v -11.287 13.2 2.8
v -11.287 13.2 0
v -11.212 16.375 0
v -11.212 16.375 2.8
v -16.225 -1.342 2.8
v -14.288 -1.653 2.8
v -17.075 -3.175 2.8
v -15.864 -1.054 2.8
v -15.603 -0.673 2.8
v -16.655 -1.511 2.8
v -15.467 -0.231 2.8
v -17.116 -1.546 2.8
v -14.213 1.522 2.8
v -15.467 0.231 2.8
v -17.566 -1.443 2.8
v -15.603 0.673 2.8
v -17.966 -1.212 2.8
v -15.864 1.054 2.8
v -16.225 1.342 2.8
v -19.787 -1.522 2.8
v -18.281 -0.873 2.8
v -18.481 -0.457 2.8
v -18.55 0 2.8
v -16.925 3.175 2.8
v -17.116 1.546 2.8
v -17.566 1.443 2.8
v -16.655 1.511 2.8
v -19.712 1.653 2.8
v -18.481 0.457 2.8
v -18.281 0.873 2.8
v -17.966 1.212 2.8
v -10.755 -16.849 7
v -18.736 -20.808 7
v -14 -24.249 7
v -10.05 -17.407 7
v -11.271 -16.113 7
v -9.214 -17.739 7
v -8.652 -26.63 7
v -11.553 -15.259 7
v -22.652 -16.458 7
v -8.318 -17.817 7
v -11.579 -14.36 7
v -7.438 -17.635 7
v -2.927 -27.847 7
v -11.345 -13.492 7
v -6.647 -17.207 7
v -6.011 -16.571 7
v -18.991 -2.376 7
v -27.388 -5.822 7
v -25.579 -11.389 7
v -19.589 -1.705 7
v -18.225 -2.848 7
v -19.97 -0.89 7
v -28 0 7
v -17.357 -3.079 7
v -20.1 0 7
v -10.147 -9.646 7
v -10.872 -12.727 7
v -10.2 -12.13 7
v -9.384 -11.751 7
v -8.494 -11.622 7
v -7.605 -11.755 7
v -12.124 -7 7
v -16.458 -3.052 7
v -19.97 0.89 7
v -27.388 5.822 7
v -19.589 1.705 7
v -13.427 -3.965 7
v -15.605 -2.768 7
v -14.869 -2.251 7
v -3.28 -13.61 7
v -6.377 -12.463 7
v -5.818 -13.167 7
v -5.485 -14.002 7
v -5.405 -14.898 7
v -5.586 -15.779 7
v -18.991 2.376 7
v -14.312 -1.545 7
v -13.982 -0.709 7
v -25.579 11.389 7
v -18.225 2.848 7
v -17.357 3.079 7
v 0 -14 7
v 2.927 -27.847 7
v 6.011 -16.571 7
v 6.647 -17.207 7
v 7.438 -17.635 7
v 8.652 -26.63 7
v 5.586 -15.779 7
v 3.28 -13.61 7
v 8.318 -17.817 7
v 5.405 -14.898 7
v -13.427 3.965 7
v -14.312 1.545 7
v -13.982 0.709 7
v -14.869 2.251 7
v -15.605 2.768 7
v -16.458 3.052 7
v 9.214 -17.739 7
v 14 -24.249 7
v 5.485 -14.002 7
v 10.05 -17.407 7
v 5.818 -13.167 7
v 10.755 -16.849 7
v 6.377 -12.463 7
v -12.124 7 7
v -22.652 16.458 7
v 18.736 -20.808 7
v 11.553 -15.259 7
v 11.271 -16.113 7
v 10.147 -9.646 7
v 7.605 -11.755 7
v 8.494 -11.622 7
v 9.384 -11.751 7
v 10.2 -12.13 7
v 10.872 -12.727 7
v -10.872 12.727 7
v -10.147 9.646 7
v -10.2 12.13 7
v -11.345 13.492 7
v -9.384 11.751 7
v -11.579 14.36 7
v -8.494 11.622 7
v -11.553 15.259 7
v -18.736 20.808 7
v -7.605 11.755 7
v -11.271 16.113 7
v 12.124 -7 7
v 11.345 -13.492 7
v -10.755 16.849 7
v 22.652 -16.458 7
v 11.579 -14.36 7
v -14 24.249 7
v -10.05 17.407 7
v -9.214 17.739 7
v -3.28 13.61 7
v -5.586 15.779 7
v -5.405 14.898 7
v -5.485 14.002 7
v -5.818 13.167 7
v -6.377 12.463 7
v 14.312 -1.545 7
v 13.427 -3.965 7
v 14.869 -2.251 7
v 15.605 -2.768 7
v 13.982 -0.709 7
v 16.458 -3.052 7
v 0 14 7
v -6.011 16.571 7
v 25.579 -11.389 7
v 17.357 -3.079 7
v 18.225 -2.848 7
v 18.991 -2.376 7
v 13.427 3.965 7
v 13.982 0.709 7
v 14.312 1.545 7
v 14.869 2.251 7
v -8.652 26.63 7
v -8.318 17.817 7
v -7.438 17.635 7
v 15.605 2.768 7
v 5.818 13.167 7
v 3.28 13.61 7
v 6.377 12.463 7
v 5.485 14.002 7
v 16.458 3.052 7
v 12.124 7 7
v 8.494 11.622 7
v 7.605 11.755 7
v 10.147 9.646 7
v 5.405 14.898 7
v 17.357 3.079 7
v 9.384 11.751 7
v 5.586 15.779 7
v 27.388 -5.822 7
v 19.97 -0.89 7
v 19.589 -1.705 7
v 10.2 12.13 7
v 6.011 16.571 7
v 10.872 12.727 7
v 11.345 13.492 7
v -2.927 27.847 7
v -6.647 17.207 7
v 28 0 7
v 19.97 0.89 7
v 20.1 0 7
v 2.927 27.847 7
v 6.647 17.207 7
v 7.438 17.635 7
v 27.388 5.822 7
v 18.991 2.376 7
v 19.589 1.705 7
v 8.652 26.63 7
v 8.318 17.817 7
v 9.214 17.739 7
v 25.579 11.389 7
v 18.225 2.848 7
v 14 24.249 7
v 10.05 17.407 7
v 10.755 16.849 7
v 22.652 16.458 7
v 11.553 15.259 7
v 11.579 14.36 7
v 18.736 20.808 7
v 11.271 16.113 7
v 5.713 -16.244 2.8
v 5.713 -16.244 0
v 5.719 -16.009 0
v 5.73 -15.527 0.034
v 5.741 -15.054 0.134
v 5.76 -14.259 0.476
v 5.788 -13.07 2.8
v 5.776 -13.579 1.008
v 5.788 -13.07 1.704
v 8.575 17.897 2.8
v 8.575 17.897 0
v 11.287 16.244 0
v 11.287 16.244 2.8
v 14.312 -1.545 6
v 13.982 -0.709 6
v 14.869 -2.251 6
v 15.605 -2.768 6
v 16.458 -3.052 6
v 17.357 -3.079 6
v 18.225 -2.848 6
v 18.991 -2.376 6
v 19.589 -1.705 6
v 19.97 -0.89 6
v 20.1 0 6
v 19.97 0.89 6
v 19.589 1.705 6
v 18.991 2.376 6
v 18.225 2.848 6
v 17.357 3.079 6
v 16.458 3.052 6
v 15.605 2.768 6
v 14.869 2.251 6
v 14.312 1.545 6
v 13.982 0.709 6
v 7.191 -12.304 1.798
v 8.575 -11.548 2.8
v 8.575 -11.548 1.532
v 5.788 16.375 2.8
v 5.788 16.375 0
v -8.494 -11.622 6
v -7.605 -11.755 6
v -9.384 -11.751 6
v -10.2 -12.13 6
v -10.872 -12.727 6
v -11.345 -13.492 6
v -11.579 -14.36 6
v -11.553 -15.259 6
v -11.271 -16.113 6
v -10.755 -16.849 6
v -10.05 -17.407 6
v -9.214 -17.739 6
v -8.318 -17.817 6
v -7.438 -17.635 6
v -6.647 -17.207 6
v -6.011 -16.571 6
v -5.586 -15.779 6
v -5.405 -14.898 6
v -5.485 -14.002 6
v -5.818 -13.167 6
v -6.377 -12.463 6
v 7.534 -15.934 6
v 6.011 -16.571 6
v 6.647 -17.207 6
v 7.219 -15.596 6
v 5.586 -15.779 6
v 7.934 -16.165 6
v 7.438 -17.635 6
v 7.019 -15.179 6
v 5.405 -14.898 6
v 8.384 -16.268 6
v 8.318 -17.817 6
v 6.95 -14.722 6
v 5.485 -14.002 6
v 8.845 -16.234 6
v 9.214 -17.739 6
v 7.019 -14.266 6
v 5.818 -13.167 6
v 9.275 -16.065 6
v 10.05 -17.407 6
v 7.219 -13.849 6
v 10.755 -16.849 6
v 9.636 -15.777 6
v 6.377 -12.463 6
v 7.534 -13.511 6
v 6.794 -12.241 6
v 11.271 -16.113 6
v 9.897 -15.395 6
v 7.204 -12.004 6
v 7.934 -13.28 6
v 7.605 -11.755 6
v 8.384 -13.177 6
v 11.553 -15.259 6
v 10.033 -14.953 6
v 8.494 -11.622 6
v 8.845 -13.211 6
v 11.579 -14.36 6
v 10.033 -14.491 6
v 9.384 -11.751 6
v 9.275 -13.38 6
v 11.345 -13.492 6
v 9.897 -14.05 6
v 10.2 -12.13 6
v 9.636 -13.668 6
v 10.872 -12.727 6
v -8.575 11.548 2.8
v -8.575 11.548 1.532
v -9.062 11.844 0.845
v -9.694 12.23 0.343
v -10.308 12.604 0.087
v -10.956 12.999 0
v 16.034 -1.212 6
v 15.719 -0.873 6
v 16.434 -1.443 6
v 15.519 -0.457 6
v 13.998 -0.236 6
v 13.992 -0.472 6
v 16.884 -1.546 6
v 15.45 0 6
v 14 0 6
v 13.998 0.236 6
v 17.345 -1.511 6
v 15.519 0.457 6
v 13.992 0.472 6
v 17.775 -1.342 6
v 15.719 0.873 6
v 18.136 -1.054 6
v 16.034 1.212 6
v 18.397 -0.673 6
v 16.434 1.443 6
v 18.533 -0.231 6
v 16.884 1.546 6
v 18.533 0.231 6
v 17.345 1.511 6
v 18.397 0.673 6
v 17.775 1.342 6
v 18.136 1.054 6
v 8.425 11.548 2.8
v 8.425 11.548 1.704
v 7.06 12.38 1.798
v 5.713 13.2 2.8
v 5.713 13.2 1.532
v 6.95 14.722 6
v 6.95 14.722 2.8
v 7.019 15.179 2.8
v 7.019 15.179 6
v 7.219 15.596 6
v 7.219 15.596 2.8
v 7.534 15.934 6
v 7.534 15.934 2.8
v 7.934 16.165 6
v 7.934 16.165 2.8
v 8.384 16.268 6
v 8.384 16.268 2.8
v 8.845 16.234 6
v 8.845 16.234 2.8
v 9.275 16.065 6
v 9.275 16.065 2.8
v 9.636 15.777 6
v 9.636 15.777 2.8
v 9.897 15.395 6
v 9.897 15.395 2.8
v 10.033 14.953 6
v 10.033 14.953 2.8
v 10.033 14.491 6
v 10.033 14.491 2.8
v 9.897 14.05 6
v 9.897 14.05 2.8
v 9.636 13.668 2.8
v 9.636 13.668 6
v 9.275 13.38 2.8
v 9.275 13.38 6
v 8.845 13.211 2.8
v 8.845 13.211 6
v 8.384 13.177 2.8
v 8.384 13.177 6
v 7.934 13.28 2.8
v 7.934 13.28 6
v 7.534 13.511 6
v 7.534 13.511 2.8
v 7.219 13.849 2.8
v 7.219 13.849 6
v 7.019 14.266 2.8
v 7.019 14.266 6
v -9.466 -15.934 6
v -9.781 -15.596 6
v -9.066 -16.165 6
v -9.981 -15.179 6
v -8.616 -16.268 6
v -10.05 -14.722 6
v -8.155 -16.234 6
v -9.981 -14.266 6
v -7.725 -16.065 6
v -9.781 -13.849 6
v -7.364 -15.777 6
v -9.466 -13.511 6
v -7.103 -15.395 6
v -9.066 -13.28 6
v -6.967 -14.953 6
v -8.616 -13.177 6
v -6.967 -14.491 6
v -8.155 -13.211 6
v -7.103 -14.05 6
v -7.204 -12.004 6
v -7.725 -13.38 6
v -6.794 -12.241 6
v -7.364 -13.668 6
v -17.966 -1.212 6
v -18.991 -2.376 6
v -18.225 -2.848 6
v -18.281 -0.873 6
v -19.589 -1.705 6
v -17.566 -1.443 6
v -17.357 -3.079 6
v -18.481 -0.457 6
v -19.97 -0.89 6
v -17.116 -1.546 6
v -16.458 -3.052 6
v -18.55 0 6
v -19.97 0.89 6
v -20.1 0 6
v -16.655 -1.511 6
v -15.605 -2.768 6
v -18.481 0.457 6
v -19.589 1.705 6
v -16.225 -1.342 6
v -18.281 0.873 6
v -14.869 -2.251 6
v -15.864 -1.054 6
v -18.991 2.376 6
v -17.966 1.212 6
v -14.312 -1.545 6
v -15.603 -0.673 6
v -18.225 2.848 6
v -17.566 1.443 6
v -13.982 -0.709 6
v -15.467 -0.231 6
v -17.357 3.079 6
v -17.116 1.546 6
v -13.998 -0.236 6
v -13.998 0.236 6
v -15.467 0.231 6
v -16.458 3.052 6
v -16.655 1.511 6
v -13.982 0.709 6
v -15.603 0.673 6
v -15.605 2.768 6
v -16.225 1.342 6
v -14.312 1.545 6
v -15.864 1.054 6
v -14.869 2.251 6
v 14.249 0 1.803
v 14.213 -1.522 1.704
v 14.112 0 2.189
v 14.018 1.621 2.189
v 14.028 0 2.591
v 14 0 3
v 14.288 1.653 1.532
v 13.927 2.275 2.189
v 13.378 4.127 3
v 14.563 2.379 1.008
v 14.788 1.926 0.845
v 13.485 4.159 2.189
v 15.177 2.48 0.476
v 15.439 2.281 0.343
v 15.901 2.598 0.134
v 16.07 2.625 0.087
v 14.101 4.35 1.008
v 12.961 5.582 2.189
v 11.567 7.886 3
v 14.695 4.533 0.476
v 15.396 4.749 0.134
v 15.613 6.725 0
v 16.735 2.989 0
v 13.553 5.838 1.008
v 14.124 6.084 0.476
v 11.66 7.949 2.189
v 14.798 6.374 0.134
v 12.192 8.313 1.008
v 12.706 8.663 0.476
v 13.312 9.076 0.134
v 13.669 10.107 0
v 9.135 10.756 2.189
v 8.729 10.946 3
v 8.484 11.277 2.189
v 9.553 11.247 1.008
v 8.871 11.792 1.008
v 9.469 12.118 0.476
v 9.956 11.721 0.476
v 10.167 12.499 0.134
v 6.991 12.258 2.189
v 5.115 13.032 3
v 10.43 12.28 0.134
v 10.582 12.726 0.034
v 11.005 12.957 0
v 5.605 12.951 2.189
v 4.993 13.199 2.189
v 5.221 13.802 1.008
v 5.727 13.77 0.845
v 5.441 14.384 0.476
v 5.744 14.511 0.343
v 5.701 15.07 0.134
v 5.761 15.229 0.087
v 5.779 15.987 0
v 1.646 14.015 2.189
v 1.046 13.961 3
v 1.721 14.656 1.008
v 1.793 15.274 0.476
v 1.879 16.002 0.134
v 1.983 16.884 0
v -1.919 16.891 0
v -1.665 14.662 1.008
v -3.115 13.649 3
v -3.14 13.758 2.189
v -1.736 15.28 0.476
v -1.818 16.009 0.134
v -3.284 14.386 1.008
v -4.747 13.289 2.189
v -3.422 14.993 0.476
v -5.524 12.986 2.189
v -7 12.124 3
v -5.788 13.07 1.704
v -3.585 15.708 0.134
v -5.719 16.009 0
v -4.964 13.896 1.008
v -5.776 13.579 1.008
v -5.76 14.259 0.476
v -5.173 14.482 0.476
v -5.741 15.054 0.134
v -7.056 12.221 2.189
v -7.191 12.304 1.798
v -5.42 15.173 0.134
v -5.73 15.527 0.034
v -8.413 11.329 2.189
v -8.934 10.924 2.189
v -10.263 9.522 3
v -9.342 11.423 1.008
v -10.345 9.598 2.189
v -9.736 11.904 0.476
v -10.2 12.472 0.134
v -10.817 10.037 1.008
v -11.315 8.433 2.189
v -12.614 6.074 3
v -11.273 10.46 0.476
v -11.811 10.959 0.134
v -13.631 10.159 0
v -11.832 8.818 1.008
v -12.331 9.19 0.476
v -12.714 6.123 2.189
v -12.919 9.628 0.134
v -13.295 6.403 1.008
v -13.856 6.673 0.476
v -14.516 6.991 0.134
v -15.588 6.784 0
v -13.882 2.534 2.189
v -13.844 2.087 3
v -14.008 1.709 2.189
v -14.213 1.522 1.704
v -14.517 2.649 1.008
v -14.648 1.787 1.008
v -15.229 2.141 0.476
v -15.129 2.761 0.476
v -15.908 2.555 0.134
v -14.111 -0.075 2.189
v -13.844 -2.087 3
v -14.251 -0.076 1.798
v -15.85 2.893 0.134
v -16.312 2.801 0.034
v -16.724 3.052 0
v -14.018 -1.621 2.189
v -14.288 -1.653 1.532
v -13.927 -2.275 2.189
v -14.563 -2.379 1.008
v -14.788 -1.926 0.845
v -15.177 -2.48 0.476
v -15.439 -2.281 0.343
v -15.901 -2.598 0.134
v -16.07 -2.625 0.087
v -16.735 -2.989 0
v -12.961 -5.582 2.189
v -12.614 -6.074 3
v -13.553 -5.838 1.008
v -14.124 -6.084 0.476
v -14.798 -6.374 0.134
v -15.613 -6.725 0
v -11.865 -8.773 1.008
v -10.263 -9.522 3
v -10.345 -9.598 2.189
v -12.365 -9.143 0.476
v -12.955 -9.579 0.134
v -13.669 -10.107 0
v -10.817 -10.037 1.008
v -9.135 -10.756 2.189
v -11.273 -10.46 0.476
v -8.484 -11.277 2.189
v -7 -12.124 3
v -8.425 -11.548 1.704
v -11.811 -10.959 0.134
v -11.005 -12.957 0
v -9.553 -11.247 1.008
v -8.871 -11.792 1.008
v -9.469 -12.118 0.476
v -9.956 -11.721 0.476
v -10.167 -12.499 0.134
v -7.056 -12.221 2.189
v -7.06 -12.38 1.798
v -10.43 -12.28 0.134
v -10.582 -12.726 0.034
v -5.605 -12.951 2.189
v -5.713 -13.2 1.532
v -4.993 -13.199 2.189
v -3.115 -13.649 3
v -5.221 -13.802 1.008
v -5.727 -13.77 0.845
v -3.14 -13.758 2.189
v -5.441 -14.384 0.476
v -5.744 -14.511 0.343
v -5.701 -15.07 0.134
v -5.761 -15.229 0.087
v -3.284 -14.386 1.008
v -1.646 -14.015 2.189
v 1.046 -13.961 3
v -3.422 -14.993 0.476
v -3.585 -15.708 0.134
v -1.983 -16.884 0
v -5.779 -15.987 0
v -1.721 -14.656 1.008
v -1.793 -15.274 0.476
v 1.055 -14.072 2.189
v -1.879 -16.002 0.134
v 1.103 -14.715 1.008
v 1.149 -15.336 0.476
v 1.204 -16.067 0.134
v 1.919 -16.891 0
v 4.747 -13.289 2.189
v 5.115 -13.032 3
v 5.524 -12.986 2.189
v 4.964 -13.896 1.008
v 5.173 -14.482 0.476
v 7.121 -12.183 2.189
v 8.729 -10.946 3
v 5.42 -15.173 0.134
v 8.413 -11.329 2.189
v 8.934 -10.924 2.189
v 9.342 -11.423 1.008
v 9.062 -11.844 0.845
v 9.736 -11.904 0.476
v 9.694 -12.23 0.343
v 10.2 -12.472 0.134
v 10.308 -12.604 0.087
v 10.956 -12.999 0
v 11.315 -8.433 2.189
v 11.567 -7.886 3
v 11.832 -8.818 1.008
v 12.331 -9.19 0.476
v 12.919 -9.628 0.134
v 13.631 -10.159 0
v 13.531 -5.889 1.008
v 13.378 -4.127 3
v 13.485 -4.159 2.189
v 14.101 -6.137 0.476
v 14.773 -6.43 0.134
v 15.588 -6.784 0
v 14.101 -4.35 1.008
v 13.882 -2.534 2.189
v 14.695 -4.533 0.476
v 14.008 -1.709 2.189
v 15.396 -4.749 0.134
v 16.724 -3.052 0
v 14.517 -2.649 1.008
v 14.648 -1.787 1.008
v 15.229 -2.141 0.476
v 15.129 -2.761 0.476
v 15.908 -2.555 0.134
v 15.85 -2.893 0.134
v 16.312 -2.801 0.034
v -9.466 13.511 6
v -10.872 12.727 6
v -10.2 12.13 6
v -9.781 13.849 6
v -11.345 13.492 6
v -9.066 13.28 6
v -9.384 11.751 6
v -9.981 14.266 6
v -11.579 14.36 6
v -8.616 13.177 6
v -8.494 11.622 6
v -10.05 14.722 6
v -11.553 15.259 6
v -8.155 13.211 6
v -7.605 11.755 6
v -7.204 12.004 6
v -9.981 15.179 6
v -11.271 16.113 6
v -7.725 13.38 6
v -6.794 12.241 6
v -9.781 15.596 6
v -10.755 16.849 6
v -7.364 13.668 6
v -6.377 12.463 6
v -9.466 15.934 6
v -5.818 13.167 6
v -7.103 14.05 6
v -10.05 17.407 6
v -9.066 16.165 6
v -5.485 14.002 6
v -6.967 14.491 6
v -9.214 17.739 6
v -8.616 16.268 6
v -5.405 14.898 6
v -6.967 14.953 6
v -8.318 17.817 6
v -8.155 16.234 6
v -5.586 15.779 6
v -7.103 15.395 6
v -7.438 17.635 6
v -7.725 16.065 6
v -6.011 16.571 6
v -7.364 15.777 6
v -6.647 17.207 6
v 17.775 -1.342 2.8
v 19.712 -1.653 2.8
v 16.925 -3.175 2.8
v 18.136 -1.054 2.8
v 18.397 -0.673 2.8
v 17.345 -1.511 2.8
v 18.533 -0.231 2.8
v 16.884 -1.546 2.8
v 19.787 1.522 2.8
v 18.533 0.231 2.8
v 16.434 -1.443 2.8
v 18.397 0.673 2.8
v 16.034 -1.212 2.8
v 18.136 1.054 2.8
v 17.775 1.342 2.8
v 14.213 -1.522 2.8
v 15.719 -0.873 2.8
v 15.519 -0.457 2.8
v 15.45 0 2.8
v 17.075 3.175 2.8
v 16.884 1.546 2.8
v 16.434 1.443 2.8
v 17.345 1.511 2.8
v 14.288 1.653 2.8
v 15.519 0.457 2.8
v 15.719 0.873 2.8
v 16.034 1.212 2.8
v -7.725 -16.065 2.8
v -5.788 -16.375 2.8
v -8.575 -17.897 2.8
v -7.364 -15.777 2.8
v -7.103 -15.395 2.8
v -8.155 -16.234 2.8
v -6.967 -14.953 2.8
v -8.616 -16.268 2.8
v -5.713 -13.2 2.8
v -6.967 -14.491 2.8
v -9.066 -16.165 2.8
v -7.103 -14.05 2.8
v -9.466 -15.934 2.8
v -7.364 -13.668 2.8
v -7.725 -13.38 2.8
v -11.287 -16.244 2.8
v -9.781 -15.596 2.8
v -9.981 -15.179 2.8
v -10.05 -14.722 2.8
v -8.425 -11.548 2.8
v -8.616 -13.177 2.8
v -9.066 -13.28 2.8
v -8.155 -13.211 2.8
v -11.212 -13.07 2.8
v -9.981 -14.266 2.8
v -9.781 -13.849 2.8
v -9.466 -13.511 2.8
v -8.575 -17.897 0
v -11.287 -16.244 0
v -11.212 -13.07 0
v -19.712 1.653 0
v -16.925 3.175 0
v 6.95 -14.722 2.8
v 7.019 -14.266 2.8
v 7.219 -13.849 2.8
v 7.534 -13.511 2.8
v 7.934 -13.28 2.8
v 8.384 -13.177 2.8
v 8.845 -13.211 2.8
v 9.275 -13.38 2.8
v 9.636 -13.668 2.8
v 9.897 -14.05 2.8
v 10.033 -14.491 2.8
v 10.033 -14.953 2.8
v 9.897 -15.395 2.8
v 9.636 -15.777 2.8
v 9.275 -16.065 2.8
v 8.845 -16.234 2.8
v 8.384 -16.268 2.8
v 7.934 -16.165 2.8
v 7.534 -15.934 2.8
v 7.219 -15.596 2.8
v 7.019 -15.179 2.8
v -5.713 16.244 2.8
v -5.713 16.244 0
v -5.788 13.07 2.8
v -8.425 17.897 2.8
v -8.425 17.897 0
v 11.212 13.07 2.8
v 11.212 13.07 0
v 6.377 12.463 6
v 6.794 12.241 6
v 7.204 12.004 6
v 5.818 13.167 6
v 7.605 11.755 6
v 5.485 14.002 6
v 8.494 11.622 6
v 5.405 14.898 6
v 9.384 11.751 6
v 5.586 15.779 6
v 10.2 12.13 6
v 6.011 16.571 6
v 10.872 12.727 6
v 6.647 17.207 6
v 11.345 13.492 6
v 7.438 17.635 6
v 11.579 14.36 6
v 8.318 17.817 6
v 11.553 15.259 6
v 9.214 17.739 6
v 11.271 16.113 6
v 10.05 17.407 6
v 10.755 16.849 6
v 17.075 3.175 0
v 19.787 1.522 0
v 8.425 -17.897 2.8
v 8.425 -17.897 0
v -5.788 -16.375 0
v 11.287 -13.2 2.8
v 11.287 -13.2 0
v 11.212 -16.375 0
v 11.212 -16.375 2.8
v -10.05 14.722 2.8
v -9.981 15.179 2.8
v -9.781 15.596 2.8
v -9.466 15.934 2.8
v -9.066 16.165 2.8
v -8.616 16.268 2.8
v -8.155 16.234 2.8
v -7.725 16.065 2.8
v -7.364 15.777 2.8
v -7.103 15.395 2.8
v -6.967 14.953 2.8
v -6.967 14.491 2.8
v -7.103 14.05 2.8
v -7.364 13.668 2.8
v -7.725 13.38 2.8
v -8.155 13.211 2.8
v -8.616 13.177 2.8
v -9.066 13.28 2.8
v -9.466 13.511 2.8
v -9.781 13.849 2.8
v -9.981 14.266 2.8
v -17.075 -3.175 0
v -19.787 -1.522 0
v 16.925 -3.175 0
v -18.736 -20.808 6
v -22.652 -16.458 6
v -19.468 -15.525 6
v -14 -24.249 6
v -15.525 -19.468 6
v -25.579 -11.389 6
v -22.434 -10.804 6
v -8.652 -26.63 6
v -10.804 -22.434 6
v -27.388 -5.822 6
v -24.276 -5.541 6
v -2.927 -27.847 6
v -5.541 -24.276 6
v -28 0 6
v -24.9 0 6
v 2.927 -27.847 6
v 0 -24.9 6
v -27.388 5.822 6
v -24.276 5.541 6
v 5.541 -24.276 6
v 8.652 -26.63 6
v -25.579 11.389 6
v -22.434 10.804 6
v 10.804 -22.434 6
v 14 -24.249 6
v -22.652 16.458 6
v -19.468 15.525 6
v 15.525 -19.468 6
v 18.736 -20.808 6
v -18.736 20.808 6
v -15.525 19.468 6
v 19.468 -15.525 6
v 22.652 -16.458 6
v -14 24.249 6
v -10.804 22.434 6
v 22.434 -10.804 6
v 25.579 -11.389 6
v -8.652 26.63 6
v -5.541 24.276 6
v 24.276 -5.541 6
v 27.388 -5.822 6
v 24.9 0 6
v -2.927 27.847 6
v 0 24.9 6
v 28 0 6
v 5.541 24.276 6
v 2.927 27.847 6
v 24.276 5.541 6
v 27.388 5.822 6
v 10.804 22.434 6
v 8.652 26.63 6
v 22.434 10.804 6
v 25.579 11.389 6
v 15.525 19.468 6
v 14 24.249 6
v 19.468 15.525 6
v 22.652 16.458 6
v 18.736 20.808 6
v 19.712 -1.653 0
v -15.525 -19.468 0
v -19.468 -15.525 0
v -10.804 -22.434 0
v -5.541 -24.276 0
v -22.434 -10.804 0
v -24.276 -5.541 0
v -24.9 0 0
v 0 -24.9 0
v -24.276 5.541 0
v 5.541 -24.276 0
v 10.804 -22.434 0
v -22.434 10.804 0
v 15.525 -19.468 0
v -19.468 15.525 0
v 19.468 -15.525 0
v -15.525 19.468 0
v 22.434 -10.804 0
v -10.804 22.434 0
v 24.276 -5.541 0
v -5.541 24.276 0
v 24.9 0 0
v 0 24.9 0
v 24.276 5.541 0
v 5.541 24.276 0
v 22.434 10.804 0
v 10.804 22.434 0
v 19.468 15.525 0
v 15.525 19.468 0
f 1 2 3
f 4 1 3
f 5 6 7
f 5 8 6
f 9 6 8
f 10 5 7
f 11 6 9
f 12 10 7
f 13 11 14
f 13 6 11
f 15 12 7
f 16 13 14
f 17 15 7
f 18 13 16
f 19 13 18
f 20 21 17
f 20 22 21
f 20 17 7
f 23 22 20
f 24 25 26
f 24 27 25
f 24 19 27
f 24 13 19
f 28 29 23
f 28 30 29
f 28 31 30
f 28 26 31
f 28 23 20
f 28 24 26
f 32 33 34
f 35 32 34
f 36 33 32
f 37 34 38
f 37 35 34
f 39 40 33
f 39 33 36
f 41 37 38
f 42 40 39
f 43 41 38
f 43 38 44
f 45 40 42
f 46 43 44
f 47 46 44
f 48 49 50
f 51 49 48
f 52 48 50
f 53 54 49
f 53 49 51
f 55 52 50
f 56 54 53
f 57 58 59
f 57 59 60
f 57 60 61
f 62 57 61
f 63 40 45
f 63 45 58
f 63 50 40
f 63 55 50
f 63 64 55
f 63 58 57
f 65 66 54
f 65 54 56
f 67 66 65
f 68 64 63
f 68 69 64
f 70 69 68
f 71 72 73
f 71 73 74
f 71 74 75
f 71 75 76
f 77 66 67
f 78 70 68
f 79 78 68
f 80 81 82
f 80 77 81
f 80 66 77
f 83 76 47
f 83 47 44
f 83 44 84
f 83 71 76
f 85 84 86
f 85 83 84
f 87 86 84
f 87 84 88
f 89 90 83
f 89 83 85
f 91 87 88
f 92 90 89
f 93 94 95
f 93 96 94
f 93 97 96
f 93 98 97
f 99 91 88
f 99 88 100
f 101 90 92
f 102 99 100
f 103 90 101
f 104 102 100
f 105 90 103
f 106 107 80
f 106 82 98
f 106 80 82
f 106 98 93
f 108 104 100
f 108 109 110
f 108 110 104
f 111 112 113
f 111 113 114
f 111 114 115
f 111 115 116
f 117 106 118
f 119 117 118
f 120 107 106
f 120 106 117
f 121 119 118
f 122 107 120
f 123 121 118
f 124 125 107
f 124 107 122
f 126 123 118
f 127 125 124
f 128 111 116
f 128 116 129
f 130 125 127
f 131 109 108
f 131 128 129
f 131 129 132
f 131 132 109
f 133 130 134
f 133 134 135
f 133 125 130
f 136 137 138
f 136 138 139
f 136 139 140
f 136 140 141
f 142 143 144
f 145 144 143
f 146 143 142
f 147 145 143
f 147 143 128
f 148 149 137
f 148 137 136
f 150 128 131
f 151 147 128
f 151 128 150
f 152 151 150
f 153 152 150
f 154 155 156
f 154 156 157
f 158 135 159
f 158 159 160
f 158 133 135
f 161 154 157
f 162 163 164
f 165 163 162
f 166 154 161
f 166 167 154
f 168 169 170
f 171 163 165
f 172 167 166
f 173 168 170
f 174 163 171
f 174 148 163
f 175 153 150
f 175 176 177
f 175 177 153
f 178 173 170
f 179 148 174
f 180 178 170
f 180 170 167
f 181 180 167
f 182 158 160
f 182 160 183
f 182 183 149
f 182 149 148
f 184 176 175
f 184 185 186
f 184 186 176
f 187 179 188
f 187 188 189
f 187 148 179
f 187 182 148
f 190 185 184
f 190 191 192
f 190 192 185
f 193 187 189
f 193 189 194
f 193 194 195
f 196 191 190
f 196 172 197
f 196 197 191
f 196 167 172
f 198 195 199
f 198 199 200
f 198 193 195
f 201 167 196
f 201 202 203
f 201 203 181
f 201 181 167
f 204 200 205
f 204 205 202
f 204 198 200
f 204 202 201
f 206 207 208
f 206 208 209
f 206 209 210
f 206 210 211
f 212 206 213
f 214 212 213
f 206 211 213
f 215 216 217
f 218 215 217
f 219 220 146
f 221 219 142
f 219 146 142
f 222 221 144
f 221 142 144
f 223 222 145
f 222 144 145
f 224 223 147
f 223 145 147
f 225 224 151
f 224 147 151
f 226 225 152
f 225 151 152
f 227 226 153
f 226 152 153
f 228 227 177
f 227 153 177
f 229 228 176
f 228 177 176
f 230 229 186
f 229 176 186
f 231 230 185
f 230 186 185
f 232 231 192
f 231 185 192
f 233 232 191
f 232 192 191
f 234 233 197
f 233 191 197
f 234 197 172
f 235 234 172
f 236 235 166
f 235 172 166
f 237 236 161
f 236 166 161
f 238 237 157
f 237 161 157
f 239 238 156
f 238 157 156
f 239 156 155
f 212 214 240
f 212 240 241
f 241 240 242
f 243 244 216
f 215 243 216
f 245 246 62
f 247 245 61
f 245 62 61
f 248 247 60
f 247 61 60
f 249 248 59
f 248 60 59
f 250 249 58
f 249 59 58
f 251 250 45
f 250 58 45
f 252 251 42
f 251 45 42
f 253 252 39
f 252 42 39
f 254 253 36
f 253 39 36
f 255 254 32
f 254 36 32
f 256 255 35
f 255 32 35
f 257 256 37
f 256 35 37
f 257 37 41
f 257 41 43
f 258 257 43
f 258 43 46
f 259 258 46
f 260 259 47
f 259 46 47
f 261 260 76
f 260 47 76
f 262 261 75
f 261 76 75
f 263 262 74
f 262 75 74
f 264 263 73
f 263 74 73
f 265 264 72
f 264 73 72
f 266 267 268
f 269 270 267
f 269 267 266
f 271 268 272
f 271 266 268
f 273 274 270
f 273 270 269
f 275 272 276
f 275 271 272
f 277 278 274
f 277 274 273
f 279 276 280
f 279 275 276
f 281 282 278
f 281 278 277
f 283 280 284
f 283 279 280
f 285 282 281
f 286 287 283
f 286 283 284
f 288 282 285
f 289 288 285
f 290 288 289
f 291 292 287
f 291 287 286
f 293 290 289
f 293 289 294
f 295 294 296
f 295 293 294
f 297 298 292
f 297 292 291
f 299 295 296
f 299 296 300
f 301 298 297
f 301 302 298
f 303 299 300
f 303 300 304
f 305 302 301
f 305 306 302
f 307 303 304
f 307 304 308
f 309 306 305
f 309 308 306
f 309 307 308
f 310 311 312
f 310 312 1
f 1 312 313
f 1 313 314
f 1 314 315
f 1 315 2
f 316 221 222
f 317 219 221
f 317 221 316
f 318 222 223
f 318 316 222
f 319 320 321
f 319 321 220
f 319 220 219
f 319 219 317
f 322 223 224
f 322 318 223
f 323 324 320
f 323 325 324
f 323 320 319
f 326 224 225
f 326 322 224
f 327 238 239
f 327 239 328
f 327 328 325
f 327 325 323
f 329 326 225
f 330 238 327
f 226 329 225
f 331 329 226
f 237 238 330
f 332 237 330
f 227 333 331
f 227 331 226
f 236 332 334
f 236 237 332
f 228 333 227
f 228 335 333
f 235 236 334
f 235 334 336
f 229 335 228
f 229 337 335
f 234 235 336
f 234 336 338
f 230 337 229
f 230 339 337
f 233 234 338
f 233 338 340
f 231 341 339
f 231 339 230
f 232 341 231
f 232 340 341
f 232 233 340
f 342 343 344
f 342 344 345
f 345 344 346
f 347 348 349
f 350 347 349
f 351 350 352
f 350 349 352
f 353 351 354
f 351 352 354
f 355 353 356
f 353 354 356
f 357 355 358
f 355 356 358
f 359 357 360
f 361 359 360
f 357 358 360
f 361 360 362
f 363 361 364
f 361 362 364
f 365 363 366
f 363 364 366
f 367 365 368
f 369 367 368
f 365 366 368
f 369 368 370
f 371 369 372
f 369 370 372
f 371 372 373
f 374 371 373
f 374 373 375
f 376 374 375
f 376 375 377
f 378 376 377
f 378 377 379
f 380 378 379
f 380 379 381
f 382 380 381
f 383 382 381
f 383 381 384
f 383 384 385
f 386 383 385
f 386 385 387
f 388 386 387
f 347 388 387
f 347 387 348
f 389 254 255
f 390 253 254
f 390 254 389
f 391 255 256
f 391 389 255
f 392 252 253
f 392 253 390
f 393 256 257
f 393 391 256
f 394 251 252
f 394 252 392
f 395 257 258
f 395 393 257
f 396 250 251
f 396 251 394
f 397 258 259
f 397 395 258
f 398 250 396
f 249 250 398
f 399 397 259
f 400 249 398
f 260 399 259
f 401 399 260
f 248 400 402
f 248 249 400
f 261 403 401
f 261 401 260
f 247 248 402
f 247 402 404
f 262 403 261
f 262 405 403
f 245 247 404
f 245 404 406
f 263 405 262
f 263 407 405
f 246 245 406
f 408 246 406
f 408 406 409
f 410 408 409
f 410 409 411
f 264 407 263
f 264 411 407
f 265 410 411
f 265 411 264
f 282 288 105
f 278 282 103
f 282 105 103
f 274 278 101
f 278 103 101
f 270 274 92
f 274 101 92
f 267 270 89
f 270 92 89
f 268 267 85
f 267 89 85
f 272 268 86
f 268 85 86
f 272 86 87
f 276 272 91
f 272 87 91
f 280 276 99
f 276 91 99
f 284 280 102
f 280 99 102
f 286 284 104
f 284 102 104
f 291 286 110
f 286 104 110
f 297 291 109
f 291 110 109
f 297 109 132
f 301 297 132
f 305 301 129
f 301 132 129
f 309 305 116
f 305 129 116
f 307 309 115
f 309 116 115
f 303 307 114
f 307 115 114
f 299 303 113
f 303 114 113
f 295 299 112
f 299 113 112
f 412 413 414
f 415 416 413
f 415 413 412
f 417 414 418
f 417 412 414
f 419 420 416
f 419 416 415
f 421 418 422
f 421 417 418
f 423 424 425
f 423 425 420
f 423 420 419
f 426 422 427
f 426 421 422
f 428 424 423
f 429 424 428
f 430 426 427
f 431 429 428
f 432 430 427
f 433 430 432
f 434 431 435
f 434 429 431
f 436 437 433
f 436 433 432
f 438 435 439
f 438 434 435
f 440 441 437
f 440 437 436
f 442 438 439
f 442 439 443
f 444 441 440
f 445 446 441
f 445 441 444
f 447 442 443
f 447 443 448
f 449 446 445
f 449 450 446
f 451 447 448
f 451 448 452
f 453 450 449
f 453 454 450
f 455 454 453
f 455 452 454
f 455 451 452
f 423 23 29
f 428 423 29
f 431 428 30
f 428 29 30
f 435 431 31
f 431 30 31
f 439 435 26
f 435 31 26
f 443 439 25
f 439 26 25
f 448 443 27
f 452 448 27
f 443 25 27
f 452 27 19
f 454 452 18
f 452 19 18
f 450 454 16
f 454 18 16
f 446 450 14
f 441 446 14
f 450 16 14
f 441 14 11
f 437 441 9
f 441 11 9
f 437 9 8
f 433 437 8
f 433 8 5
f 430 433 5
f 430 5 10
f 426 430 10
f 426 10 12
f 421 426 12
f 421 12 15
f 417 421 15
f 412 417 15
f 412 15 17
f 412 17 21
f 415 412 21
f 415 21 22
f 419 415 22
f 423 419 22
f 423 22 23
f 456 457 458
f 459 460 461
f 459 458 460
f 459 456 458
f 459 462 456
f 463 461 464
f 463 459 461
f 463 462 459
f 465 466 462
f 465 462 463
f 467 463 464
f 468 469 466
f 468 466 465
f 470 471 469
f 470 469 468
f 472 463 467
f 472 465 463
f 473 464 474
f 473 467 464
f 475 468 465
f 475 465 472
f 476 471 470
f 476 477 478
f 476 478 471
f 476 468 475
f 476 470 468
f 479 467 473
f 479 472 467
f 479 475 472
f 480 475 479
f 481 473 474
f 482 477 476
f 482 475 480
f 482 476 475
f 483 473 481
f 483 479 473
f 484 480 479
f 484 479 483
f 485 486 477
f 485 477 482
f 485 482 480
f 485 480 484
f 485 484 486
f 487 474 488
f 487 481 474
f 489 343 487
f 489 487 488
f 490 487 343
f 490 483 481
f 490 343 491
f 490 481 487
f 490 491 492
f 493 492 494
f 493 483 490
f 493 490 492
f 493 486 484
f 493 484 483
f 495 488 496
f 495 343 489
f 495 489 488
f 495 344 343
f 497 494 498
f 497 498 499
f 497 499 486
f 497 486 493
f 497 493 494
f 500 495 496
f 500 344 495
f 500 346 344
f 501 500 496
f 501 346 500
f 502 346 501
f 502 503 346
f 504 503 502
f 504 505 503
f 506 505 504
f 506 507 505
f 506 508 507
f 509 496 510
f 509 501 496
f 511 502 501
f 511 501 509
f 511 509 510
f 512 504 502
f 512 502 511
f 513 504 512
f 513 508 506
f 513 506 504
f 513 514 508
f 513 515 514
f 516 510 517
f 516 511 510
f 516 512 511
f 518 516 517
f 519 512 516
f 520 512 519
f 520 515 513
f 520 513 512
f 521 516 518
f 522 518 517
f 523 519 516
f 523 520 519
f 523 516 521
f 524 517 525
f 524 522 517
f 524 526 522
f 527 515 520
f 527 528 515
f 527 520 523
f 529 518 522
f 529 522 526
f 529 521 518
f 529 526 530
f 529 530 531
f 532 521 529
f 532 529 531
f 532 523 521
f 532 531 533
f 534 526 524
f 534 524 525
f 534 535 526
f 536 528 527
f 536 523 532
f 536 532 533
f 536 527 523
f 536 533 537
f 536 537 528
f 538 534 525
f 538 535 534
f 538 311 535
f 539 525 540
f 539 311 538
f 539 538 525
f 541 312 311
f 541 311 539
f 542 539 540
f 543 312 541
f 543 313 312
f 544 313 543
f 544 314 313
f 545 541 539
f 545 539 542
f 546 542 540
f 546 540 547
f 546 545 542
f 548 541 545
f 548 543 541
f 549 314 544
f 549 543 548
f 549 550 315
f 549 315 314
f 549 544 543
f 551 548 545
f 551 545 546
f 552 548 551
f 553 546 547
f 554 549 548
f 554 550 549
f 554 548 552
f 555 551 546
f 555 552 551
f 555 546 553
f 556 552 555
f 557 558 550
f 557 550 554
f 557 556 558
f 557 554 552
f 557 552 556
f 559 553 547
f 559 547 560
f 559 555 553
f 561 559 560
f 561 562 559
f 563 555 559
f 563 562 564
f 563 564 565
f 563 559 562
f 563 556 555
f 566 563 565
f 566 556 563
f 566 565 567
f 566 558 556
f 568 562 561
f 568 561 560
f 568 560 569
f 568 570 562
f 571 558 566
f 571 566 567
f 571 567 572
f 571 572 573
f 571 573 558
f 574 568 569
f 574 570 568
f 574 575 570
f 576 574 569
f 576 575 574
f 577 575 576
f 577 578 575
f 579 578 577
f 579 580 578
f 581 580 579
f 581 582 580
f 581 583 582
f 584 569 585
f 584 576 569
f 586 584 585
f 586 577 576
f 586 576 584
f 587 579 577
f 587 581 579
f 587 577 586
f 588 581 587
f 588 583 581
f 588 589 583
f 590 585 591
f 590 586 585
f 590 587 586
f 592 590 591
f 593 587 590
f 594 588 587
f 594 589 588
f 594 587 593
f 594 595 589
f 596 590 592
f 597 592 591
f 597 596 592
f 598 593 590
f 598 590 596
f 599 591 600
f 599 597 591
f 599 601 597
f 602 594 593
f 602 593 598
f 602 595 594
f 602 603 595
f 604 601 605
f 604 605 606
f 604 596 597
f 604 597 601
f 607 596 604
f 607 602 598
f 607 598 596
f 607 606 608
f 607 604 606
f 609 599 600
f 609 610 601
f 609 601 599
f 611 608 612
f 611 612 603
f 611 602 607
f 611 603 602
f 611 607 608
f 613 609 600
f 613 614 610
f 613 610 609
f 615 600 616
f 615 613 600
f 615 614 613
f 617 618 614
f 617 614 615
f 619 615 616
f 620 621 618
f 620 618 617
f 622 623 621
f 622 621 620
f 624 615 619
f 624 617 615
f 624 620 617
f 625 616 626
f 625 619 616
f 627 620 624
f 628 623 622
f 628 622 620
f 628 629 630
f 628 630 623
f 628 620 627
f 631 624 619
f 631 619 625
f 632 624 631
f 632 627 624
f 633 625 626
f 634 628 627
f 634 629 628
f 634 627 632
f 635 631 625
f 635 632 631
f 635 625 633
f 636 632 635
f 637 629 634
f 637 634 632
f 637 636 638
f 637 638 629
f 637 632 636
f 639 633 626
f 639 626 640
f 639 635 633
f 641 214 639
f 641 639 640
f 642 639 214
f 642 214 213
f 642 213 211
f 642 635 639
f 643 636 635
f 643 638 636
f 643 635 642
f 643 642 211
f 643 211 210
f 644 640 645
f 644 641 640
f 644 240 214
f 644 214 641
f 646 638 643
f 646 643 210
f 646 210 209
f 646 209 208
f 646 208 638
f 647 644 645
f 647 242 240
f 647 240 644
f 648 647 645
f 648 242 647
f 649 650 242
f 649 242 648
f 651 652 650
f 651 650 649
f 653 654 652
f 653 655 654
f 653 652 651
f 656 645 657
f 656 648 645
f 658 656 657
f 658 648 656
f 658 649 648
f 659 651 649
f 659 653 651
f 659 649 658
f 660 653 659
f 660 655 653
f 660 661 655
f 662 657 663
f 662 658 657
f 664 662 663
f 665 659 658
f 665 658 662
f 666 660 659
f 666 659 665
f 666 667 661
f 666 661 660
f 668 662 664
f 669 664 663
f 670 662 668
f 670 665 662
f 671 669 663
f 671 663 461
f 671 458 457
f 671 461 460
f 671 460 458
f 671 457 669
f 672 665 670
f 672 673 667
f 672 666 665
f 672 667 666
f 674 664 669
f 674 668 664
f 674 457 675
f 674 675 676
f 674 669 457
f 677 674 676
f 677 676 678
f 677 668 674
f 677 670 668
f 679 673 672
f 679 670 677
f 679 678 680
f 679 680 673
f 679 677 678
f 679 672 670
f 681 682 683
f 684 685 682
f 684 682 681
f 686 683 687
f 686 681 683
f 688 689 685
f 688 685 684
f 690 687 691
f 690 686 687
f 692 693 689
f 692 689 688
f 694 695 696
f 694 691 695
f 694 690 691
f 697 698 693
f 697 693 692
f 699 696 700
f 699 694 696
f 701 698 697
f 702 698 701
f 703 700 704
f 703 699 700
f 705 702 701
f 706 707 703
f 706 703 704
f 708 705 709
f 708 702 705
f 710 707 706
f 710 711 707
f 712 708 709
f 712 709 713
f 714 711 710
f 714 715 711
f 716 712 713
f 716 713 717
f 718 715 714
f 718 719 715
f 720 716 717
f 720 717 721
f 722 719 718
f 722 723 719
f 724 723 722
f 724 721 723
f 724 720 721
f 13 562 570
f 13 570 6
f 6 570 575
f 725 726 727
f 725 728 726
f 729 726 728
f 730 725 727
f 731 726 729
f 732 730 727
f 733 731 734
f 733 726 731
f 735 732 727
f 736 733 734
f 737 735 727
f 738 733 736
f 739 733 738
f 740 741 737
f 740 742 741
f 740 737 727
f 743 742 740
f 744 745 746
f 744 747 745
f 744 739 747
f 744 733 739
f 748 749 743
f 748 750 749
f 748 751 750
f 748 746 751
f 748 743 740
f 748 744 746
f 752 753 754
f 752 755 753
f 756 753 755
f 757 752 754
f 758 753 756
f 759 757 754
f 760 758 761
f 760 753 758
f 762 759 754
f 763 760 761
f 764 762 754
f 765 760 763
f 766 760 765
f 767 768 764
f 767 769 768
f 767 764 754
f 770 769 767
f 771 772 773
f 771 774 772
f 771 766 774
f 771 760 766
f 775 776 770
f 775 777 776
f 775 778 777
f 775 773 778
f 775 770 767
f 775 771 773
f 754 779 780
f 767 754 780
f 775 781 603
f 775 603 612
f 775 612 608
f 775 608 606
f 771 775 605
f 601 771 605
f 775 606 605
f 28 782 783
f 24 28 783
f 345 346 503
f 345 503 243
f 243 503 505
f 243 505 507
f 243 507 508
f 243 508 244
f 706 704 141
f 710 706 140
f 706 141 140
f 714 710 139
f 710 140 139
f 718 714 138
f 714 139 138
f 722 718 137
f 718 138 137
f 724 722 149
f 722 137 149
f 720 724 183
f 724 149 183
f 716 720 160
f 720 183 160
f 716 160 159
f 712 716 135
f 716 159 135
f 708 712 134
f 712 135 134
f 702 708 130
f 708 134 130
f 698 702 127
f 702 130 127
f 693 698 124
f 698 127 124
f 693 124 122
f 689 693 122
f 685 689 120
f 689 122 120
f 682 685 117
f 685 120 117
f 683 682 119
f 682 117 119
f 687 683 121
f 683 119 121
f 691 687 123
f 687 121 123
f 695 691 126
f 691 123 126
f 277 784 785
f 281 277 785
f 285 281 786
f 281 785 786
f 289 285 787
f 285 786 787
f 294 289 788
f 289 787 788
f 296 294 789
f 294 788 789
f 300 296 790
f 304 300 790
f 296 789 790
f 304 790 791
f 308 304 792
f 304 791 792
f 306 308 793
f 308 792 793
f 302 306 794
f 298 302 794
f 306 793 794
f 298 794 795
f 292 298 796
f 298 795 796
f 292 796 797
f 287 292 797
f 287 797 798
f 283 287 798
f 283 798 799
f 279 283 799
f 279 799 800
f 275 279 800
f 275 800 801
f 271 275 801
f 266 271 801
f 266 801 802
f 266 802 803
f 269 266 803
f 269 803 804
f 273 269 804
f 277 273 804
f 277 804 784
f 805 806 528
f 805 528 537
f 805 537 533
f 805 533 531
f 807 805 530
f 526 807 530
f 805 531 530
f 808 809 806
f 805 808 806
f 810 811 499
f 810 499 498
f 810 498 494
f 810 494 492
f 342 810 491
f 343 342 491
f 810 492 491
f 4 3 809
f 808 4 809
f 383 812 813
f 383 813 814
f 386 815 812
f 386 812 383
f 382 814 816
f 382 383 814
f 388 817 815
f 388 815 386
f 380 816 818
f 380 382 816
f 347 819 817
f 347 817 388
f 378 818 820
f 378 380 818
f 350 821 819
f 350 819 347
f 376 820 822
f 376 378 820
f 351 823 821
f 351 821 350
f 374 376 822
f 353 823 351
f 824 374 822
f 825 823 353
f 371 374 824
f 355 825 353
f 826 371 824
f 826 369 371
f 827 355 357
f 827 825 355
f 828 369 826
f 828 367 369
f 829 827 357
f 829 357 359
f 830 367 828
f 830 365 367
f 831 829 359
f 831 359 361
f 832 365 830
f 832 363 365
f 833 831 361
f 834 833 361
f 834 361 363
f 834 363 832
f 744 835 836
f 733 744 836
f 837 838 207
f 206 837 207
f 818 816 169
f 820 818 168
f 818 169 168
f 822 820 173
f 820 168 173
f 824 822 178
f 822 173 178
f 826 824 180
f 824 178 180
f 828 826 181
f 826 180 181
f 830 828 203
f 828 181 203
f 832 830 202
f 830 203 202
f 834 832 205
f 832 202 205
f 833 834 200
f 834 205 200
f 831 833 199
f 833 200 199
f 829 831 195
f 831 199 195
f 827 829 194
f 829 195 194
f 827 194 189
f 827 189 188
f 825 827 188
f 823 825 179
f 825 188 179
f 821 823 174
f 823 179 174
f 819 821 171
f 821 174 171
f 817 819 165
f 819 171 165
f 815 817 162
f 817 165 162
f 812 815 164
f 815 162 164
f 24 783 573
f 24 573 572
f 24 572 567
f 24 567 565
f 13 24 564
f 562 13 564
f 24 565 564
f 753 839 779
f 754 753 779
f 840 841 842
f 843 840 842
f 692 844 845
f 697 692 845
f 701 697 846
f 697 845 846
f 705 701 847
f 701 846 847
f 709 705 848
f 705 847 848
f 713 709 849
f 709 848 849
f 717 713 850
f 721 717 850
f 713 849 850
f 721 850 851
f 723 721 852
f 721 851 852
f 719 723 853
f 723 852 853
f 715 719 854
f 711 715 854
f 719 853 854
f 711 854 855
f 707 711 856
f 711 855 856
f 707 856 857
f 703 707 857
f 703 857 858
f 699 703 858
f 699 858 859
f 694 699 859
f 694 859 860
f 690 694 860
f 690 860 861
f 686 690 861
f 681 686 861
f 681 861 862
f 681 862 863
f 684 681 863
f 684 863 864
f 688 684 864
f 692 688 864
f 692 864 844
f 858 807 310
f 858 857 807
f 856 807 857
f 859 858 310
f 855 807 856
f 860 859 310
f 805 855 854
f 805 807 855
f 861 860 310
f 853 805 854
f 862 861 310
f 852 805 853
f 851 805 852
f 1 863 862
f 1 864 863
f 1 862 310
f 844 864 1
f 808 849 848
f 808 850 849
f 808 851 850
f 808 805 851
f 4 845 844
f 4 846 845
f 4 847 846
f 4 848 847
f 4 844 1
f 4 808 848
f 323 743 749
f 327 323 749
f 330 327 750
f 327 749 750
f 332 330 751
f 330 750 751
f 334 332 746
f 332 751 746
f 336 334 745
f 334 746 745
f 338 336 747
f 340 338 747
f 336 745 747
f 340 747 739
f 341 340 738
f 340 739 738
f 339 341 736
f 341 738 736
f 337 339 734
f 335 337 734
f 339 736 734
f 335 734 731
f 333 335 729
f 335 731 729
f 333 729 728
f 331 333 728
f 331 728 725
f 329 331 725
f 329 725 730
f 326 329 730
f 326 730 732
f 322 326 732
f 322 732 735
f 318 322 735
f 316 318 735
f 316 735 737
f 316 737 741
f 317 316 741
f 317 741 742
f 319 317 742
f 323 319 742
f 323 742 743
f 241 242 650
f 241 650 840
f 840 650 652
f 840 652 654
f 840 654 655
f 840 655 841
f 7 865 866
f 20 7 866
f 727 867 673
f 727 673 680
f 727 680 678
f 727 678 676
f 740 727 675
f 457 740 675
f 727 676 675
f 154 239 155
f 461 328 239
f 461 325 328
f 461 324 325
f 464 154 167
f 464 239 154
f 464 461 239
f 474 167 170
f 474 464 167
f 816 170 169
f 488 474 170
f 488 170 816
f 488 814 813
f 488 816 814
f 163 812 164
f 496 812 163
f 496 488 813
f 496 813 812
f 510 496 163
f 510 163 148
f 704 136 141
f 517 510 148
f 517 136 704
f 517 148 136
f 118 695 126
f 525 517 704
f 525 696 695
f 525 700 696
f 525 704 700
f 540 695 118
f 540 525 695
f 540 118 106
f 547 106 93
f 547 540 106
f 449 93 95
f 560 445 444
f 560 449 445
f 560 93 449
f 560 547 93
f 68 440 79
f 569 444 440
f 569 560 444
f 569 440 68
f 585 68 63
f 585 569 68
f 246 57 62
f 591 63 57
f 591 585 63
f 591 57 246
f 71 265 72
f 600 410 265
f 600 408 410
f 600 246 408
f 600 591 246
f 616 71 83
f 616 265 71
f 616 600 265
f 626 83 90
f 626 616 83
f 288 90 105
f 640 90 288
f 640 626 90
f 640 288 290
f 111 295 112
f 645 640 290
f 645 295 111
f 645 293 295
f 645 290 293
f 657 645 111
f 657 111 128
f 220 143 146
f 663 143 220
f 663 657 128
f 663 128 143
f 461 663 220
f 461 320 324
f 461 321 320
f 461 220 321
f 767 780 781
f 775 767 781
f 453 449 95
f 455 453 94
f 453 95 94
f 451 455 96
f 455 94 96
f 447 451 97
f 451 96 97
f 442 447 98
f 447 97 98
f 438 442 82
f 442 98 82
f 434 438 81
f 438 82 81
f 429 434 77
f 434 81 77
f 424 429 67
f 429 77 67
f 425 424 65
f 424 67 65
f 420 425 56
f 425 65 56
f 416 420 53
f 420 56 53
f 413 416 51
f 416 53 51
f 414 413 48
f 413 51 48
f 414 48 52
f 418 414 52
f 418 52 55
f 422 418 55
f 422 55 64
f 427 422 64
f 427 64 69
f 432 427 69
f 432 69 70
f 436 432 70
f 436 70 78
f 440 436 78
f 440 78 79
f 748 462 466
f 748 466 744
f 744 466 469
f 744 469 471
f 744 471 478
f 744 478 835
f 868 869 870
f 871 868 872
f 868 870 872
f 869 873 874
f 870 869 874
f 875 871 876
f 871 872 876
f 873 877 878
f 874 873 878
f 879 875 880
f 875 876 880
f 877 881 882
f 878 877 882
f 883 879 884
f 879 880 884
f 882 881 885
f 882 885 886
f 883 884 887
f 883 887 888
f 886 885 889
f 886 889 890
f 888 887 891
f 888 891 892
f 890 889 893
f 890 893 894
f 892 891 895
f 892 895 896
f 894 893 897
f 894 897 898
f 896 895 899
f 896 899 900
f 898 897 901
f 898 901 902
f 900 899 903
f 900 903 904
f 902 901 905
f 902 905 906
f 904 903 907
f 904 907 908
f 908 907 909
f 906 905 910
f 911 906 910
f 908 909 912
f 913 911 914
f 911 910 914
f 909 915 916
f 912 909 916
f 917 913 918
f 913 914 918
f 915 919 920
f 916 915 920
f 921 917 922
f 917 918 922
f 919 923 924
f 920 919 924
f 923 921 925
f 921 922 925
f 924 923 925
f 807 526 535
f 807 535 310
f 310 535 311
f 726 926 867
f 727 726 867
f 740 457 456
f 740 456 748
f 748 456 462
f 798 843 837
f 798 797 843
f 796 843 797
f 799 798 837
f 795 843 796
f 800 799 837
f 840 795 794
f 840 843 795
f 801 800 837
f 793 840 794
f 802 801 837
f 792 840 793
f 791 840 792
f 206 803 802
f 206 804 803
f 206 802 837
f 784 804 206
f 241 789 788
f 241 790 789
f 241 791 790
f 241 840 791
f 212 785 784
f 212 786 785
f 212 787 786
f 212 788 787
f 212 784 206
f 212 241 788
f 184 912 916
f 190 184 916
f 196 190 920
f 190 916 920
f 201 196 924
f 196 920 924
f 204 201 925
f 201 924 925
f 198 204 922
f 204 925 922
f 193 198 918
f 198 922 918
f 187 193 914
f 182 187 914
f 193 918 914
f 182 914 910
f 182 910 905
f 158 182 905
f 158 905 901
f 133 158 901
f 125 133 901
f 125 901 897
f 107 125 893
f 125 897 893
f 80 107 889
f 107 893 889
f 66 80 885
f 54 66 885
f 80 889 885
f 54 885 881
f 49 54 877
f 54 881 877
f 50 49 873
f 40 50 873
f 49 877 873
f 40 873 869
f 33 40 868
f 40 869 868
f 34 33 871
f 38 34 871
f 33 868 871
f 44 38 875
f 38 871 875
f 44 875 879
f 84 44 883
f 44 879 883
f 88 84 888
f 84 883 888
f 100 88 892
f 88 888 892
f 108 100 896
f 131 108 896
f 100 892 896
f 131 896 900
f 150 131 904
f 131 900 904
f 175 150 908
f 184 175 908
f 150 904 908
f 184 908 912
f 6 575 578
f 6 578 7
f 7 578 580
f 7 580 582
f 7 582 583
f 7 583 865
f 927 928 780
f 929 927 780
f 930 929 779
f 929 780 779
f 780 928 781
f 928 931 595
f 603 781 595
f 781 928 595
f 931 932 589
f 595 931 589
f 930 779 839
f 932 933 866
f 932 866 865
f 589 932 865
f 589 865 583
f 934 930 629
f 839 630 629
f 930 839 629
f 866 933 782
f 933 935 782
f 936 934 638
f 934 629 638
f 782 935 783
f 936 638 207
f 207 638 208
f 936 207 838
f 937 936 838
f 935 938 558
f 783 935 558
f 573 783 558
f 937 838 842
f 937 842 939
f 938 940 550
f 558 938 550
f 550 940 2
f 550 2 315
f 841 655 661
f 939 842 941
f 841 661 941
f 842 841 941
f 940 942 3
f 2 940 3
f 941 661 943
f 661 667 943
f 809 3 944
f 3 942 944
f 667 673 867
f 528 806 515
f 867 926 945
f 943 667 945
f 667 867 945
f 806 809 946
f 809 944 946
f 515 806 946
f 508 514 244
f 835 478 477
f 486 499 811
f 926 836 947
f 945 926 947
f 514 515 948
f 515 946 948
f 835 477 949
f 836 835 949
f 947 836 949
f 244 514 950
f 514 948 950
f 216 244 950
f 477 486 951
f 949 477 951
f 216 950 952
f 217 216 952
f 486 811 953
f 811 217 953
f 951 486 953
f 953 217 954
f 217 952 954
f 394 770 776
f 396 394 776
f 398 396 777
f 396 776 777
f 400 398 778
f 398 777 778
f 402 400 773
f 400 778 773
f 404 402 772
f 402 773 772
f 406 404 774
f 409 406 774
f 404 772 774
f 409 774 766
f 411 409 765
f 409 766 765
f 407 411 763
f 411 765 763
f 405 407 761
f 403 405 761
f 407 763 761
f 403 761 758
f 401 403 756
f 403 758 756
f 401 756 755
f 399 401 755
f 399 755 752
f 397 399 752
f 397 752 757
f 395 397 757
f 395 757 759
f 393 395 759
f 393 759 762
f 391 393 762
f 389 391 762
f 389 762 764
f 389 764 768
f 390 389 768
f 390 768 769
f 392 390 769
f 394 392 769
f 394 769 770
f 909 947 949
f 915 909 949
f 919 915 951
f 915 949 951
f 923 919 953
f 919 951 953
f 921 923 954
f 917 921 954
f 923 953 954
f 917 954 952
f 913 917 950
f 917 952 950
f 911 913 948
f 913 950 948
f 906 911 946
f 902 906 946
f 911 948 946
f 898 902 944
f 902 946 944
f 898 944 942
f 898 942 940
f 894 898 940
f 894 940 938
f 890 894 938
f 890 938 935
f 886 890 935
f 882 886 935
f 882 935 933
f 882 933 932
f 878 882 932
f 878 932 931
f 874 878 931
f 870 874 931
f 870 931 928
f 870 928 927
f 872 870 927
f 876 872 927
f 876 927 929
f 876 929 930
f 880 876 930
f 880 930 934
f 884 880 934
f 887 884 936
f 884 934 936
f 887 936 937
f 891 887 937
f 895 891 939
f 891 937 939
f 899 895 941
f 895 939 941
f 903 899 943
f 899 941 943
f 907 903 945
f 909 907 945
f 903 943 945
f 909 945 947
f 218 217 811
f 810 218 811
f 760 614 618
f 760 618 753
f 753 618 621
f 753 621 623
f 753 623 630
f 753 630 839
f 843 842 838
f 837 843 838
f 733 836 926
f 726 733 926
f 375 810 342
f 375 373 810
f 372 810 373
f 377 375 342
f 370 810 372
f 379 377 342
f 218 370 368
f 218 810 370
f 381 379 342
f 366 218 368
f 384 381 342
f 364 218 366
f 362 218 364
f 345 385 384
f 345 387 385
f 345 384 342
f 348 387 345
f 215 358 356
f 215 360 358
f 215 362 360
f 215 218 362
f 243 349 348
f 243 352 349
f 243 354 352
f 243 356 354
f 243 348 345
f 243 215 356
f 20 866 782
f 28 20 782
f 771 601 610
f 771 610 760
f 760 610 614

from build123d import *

# Parameters (mm, degrees)
SKETCH_1_R          = 24.9
SKETCH_1_R_2        = 14
EXTRUDE_1_DEPTH     = 7
SKETCH_3_R          = 1.55
CUT_EXTRUDE_2_DEPTH = 10
SKETCH_4_R          = 3.1
CUT_EXTRUDE_3_DEPTH = 1
EXTRUDE_START       = -1
SKETCH_6_R          = 28
SKETCH_6_R_2        = 24.9
EXTRUDE_2_DEPTH     = 1
CUT_EXTRUDE_4_DEPTH = 2.8
FILLET_1_R          = 3


with BuildPart() as part:
    # 草图1 → 凸台-拉伸1 (new body)
    with BuildSketch(Plane.XY):
        Circle(SKETCH_1_R)
        Circle(SKETCH_1_R_2, mode=Mode.SUBTRACT)
    extrude(amount=EXTRUDE_1_DEPTH)

    # 草图3 → 切除-拉伸2 (cut)
    with BuildSketch(Plane(origin=(0, 0, 0), x_dir=(-1, 0, 0), z_dir=(0, 0, -1))):
        with Locations((8.5, -14.722431864)):
            Circle(SKETCH_3_R)
        with Locations((-8.5, -14.722431864)):
            Circle(SKETCH_3_R)
        with Locations((-17, 0)):
            Circle(SKETCH_3_R)
        with Locations((-8.5, 14.722431864)):
            Circle(SKETCH_3_R)
        with Locations((17, 0)):
            Circle(SKETCH_3_R)
        with Locations((8.5, 14.722431864)):
            Circle(SKETCH_3_R)
    extrude(amount=-CUT_EXTRUDE_2_DEPTH, mode=Mode.SUBTRACT)

    # 草图4 → 切除-拉伸3 (cut)
    with BuildSketch(Plane.XY.offset(7)):
        with Locations((17, 0)):
            Circle(SKETCH_4_R)
        with Locations((8.5, -14.722431864)):
            Circle(SKETCH_4_R)
        with Locations((-8.5, -14.722431864)):
            Circle(SKETCH_4_R)
        with Locations((-17, 0)):
            Circle(SKETCH_4_R)
        with Locations((-8.5, 14.722431864)):
            Circle(SKETCH_4_R)
        with Locations((8.5, 14.722431864)):
            Circle(SKETCH_4_R)
    extrude(amount=-CUT_EXTRUDE_3_DEPTH, mode=Mode.SUBTRACT)

    # 草图6 → 凸台-拉伸2 (add)
    with BuildSketch(Plane.XY.offset(7).offset(EXTRUDE_START)):
        Circle(SKETCH_6_R)
        Circle(SKETCH_6_R_2, mode=Mode.SUBTRACT)
    extrude(amount=EXTRUDE_2_DEPTH)

    # 草图7 → 切除-拉伸4 (cut)
    with BuildSketch(Plane(origin=(0, 0, 0), x_dir=(-1, 0, 0), z_dir=(0, 0, -1))):
        Polygon((8.575410724, -17.896962783), (11.286929783, -16.244389721), (11.211519059, -13.069858802), (8.424589276, -11.547900945), (5.713070217, -13.200474007), (5.788480941, -16.375004926), align=None)
        Polygon((19.786929783, -1.521957857), (19.711519059, 1.652573062), (16.924589276, 3.174530919), (14.213070217, 1.521957857), (14.288480941, -1.652573062), (17.075410724, -3.174530919), align=None)
        Polygon((-11.211519059, -16.375004926), (-8.424589276, -17.896962783), (-5.713070217, -16.244389721), (-5.788480941, -13.069858802), (-8.575410724, -11.547900945), (-11.286929783, -13.200474007), align=None)
        Polygon((-19.786929783, 1.521957857), (-19.711519059, -1.652573062), (-16.924589276, -3.174530919), (-14.213070217, -1.521957857), (-14.288480941, 1.652573062), (-17.075410724, 3.174530919), align=None)
        Polygon((-8.575410724, 17.896962783), (-11.286929783, 16.244389721), (-11.211519059, 13.069858802), (-8.424589276, 11.547900945), (-5.713070217, 13.200474007), (-5.788480941, 16.375004926), align=None)
        Polygon((11.211519059, 16.375004926), (8.424589276, 17.896962783), (5.713070217, 16.244389721), (5.788480941, 13.069858802), (8.575410724, 11.547900945), (11.286929783, 13.200474007), align=None)
    extrude(amount=-CUT_EXTRUDE_4_DEPTH, mode=Mode.SUBTRACT)

    # 圆角1
    # the kernel refuses this fillet: 3 mm, written as the material it takes off along each edge
    with BuildSketch(Plane(origin=(0, 0, 0), x_dir=(1, 0, 0), z_dir=(0, -1, 0))) as fillet_1_piece_1:
        with BuildLine():
            CenterArc((14 + FILLET_1_R, FILLET_1_R), FILLET_1_R, 180, 90)
            Line((14, FILLET_1_R), (14, 0))
            Line((14, 0), (14 + FILLET_1_R, 0))
        make_face()
    revolve(axis=Axis((0, 0, 0), (0, 0, 1)), mode=Mode.SUBTRACT)


solid = part.part
